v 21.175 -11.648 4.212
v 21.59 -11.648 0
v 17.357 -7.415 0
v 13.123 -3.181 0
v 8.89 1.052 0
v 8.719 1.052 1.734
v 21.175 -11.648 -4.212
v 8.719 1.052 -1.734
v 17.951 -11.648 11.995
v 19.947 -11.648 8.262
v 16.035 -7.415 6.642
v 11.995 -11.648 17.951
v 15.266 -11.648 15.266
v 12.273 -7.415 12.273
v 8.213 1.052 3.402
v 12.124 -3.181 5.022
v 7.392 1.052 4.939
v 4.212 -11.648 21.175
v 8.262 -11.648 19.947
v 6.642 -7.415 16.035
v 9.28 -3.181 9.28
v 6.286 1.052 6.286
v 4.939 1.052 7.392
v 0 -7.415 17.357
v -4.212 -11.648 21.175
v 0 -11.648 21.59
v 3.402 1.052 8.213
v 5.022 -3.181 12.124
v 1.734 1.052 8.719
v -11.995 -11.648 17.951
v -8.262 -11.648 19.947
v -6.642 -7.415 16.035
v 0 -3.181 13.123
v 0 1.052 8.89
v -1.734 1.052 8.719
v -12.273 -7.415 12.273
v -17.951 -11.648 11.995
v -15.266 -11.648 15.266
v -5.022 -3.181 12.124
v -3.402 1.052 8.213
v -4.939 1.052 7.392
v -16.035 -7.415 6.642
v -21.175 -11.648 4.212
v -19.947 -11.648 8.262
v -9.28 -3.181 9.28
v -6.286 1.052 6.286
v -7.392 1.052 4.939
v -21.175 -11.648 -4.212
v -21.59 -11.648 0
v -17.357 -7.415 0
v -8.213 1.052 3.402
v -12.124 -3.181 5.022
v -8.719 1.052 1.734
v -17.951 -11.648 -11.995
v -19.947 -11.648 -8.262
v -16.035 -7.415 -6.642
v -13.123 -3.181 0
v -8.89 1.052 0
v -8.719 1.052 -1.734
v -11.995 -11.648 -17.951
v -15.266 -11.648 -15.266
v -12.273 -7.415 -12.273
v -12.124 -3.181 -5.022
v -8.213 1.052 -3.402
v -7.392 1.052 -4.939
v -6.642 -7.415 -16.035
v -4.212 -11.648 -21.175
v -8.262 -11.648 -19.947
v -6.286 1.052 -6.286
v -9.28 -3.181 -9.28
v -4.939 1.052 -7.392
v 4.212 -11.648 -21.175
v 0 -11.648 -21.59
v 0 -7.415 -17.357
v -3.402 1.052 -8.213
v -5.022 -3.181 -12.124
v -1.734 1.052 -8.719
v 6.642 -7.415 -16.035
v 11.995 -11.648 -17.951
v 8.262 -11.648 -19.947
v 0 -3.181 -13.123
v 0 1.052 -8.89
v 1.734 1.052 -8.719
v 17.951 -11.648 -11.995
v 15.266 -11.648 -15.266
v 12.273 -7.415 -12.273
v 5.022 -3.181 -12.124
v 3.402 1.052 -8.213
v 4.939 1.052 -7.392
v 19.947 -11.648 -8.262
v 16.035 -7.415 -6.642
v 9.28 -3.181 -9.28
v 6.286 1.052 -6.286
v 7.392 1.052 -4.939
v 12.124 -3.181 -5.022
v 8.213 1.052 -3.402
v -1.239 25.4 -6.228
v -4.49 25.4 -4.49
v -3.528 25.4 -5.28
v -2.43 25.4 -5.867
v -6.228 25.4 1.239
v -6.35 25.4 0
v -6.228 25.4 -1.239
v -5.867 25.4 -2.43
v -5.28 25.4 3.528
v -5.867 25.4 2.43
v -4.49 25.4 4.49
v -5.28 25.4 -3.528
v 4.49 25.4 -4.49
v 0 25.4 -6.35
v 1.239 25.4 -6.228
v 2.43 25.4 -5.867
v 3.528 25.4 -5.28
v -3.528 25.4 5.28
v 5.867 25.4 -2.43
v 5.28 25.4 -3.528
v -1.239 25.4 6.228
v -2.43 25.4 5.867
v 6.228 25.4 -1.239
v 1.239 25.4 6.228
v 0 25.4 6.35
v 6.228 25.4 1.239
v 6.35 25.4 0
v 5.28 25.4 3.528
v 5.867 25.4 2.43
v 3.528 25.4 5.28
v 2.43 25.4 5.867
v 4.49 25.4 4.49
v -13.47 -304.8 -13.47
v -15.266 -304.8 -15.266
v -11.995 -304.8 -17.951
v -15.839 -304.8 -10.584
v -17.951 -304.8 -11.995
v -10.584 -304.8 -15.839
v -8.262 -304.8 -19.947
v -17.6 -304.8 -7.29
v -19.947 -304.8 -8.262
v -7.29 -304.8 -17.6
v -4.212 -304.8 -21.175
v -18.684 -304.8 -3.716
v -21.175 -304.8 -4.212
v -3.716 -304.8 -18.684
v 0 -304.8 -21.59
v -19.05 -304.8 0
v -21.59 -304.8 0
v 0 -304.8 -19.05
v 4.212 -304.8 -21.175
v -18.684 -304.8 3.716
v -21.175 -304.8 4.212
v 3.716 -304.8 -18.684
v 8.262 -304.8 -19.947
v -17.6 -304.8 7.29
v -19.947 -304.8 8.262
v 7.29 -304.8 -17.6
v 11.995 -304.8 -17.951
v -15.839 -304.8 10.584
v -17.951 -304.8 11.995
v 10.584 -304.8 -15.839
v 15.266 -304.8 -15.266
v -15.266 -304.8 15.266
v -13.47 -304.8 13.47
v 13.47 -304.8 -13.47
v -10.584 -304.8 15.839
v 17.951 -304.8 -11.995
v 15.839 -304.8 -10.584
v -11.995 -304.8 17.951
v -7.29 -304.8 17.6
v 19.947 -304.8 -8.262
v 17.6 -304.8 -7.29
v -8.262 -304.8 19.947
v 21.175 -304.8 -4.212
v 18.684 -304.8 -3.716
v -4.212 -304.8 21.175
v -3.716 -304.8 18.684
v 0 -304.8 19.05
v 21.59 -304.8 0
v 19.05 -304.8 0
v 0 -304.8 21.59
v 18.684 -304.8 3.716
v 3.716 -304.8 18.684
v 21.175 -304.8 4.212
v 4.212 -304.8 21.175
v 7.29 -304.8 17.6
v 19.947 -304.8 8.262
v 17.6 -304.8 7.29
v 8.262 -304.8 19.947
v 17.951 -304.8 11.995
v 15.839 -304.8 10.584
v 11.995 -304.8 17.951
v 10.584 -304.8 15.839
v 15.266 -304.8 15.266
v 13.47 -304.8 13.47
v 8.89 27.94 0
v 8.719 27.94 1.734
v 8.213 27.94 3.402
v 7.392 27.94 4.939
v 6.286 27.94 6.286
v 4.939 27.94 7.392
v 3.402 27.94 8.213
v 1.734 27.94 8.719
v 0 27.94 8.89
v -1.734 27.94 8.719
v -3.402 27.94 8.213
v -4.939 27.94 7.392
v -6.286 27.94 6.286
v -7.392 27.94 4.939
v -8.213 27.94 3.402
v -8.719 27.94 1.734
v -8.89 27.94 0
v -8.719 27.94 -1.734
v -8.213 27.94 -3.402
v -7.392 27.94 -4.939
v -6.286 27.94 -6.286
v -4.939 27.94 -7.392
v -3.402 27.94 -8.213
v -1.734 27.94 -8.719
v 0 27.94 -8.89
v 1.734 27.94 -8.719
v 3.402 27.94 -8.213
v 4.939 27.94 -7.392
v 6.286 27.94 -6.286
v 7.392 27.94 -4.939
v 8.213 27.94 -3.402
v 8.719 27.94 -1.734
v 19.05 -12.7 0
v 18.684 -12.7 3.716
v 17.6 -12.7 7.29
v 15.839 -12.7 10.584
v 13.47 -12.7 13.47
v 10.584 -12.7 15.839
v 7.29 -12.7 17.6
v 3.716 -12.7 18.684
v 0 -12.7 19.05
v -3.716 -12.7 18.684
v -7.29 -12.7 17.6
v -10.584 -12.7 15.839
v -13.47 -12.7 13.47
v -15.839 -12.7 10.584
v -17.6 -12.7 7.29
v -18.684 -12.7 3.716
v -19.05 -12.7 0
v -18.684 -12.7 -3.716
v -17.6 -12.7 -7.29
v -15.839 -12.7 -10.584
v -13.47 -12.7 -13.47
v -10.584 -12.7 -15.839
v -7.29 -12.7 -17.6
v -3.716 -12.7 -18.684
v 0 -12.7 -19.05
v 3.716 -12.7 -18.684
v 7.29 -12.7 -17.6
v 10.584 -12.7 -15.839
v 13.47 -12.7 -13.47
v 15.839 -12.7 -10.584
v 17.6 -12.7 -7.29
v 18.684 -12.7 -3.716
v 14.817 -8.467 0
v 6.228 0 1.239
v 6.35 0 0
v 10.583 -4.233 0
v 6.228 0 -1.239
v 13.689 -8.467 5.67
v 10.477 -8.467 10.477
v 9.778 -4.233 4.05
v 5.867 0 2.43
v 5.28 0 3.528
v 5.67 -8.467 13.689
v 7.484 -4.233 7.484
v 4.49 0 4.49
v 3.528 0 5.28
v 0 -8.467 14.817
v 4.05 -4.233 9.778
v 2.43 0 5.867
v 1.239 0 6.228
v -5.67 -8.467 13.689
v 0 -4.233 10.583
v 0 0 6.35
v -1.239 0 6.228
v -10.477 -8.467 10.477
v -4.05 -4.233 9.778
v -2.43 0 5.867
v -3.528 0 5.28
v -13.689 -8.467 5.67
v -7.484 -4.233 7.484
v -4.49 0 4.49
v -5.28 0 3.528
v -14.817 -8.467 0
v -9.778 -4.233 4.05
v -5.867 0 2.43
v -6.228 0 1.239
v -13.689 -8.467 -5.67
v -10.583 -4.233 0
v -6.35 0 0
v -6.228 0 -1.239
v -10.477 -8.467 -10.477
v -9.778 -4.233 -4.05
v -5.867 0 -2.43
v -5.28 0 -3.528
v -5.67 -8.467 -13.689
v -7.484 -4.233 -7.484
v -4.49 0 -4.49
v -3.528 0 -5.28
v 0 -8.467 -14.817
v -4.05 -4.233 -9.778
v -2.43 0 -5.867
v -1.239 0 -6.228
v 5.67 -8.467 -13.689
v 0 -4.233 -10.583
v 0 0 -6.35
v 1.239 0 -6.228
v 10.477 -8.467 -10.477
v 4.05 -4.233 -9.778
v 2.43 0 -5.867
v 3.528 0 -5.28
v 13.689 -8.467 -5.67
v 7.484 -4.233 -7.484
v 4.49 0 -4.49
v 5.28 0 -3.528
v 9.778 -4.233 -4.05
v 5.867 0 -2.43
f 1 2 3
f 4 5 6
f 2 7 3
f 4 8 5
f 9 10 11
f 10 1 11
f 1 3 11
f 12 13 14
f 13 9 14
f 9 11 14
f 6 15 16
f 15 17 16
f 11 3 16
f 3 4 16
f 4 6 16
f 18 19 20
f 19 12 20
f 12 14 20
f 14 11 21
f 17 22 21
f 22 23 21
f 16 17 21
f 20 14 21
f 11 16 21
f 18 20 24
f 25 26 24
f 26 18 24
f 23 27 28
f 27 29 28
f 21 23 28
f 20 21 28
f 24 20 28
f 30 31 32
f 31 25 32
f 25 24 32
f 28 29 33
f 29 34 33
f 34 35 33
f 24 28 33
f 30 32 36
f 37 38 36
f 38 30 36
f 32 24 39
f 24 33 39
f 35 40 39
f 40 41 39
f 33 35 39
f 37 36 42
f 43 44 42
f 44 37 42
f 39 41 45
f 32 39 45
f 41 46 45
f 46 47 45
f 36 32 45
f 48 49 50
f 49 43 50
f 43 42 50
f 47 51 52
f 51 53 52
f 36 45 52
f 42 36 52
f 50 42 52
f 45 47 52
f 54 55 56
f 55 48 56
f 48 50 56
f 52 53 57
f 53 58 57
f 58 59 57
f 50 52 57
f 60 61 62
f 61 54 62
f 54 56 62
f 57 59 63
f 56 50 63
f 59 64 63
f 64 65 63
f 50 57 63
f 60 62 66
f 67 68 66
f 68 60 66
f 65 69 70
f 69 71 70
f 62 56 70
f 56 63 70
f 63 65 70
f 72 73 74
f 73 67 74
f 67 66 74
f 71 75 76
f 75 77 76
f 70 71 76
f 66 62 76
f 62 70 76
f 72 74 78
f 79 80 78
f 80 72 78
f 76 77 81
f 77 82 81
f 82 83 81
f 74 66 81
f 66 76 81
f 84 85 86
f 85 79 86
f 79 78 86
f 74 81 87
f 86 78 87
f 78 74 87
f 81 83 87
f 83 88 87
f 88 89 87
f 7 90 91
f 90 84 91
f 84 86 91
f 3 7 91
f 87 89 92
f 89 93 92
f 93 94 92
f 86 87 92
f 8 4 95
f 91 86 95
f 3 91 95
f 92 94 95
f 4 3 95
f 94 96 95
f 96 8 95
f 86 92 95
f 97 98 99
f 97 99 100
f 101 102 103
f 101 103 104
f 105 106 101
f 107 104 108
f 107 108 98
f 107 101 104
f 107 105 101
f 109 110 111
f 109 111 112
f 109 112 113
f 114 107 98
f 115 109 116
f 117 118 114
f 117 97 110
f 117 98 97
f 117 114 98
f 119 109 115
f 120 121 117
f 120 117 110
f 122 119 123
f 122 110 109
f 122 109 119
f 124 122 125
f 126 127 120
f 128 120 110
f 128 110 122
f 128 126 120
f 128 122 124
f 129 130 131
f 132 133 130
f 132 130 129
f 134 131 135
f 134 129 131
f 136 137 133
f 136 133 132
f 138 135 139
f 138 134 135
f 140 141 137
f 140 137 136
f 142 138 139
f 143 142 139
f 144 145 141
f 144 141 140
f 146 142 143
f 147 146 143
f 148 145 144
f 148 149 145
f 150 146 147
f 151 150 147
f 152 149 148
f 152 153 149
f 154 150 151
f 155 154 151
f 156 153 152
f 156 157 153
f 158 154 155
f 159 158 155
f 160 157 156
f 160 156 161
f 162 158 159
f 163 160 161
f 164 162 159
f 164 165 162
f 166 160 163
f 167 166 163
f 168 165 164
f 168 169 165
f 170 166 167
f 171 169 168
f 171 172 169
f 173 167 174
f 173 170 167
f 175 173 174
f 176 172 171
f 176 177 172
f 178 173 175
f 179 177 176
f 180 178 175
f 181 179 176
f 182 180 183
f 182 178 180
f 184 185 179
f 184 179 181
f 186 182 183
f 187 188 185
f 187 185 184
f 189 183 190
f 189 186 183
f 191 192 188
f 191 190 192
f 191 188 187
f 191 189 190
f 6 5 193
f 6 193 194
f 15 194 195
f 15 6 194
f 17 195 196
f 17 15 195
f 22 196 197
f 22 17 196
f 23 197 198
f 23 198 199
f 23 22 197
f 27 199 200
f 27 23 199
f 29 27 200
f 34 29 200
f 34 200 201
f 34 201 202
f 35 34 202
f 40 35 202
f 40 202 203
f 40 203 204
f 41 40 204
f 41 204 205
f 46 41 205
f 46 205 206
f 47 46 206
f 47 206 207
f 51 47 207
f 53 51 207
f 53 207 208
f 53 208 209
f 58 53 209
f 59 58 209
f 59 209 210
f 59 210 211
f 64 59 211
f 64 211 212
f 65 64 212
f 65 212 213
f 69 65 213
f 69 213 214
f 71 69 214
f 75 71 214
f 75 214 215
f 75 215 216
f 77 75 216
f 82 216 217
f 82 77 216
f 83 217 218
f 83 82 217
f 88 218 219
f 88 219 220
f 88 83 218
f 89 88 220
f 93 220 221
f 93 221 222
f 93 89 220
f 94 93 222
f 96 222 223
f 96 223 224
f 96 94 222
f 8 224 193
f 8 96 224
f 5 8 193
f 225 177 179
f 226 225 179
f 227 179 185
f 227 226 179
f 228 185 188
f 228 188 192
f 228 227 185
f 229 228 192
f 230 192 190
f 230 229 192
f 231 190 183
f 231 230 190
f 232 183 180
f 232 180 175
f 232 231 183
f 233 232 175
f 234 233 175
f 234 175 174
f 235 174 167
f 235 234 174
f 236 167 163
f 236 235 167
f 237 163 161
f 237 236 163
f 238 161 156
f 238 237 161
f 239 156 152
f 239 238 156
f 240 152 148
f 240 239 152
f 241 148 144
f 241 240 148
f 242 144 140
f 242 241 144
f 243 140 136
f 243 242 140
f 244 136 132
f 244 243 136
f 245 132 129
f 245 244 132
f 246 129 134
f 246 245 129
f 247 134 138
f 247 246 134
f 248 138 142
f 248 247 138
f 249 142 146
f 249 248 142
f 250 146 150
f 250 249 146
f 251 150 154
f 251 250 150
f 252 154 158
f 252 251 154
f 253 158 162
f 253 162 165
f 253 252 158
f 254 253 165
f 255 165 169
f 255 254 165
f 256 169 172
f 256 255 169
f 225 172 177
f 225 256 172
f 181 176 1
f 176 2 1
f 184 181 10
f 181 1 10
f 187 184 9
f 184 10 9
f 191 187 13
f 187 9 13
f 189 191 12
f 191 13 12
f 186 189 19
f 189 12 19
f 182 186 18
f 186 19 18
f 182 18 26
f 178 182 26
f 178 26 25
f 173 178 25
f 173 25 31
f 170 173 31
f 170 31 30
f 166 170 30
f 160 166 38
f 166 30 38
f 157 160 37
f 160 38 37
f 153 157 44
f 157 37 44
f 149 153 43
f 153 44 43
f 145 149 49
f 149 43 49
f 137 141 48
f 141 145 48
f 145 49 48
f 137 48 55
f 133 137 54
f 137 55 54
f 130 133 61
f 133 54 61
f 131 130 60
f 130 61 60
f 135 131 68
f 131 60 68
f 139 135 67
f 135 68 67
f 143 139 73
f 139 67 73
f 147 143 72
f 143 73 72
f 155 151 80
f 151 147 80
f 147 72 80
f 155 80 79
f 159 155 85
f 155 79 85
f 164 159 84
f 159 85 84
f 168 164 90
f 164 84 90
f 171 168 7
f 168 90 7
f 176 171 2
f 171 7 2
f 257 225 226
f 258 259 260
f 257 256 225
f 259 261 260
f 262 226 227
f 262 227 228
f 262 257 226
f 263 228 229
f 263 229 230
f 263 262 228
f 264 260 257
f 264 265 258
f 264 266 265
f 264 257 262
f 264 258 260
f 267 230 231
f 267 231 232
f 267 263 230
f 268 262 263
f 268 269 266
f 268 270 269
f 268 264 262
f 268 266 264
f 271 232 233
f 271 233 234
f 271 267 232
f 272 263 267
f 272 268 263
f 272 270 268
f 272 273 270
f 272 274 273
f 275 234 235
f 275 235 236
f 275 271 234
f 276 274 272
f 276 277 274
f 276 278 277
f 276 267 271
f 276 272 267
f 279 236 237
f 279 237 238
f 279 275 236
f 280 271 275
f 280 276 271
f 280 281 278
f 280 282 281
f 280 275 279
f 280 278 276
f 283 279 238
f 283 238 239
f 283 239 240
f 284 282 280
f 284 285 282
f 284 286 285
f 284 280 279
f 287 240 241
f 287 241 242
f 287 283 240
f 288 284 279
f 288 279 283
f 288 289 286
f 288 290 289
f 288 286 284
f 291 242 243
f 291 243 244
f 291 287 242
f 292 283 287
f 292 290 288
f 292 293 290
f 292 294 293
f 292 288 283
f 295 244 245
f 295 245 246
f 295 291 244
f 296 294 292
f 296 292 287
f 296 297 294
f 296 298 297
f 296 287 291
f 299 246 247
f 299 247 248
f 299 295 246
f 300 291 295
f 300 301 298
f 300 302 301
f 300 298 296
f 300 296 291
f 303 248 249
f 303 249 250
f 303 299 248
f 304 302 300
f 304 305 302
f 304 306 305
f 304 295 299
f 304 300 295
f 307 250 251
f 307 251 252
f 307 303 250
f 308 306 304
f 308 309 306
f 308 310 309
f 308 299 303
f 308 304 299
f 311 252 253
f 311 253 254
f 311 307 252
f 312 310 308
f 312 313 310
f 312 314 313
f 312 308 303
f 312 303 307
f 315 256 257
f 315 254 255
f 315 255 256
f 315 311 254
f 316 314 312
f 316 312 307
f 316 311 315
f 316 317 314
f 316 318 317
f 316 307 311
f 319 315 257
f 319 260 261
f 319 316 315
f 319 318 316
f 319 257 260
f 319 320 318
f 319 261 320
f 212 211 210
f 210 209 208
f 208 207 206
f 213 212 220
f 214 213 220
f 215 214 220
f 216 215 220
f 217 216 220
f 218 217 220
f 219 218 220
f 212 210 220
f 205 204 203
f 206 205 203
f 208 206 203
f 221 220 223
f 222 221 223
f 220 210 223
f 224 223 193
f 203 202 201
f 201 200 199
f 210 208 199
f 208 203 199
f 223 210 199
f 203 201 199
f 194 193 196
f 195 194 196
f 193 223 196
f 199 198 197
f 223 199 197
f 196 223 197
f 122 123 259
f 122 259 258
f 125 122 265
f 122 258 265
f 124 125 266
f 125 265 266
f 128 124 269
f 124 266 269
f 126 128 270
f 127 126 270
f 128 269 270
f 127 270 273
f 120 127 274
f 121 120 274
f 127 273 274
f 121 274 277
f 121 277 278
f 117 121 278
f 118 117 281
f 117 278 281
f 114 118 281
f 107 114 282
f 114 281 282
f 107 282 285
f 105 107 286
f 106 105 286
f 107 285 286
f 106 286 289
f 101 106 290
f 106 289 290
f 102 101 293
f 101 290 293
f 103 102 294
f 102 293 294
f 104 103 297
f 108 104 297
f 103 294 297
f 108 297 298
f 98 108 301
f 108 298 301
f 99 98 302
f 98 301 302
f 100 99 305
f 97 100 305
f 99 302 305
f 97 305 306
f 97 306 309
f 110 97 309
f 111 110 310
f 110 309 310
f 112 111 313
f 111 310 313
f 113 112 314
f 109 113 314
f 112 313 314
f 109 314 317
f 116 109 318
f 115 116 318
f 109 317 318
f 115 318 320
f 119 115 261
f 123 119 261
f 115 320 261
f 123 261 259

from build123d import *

# Parameters (mm, degrees)
F0_R     = 19.05
F1_DEPTH = 304.8
F3_SIZE  = 12.7
F4_DEPTH = 25.4
F5_T     = 2.54
F6_W     = 31.75
F6_H     = 19.05
F7_DEPTH = 5.08
F8_R     = 9.7478523701
F9_DEPTH = 25.4


with BuildPart() as f1:
    # F0 (on Front) → F1 (new body)
    with BuildSketch(Plane.XZ):
        Circle(F0_R)
    extrude(amount=F1_DEPTH)

    # F3
    f3_edges = [f1.edges().sort_by_distance(p)[0] for p in [
        (-19.05, 0, 0),
    ]]
    chamfer(f3_edges, length=F3_SIZE)

    # F4 (add): a face of the model
    f4_faces = [f1.faces().sort_by_distance(p)[0] for p in [
        (0, 0, 0),
    ]]
    extrude(f4_faces, amount=F4_DEPTH)

    # F5
    f5_openings = [f1.faces().sort_by_distance(p)[0] for p in [
        (0, -304.8, 0),
    ]]
    offset(amount=F5_T, openings=f5_openings, kind=Kind.INTERSECTION)


with BuildPart() as f7:
    # F6 (on face) → F7 (new body)
    with BuildSketch(Plane.XZ.offset(304.8)):
        Rectangle(F6_W, F6_H)
    extrude(amount=F7_DEPTH)


with BuildPart() as f9:
    # F8 (on face) → F9 (new body)
    with BuildSketch(Plane.XZ.offset(309.88)):
        Circle(F8_R)
    extrude(amount=-F9_DEPTH)


solid = f1.part
